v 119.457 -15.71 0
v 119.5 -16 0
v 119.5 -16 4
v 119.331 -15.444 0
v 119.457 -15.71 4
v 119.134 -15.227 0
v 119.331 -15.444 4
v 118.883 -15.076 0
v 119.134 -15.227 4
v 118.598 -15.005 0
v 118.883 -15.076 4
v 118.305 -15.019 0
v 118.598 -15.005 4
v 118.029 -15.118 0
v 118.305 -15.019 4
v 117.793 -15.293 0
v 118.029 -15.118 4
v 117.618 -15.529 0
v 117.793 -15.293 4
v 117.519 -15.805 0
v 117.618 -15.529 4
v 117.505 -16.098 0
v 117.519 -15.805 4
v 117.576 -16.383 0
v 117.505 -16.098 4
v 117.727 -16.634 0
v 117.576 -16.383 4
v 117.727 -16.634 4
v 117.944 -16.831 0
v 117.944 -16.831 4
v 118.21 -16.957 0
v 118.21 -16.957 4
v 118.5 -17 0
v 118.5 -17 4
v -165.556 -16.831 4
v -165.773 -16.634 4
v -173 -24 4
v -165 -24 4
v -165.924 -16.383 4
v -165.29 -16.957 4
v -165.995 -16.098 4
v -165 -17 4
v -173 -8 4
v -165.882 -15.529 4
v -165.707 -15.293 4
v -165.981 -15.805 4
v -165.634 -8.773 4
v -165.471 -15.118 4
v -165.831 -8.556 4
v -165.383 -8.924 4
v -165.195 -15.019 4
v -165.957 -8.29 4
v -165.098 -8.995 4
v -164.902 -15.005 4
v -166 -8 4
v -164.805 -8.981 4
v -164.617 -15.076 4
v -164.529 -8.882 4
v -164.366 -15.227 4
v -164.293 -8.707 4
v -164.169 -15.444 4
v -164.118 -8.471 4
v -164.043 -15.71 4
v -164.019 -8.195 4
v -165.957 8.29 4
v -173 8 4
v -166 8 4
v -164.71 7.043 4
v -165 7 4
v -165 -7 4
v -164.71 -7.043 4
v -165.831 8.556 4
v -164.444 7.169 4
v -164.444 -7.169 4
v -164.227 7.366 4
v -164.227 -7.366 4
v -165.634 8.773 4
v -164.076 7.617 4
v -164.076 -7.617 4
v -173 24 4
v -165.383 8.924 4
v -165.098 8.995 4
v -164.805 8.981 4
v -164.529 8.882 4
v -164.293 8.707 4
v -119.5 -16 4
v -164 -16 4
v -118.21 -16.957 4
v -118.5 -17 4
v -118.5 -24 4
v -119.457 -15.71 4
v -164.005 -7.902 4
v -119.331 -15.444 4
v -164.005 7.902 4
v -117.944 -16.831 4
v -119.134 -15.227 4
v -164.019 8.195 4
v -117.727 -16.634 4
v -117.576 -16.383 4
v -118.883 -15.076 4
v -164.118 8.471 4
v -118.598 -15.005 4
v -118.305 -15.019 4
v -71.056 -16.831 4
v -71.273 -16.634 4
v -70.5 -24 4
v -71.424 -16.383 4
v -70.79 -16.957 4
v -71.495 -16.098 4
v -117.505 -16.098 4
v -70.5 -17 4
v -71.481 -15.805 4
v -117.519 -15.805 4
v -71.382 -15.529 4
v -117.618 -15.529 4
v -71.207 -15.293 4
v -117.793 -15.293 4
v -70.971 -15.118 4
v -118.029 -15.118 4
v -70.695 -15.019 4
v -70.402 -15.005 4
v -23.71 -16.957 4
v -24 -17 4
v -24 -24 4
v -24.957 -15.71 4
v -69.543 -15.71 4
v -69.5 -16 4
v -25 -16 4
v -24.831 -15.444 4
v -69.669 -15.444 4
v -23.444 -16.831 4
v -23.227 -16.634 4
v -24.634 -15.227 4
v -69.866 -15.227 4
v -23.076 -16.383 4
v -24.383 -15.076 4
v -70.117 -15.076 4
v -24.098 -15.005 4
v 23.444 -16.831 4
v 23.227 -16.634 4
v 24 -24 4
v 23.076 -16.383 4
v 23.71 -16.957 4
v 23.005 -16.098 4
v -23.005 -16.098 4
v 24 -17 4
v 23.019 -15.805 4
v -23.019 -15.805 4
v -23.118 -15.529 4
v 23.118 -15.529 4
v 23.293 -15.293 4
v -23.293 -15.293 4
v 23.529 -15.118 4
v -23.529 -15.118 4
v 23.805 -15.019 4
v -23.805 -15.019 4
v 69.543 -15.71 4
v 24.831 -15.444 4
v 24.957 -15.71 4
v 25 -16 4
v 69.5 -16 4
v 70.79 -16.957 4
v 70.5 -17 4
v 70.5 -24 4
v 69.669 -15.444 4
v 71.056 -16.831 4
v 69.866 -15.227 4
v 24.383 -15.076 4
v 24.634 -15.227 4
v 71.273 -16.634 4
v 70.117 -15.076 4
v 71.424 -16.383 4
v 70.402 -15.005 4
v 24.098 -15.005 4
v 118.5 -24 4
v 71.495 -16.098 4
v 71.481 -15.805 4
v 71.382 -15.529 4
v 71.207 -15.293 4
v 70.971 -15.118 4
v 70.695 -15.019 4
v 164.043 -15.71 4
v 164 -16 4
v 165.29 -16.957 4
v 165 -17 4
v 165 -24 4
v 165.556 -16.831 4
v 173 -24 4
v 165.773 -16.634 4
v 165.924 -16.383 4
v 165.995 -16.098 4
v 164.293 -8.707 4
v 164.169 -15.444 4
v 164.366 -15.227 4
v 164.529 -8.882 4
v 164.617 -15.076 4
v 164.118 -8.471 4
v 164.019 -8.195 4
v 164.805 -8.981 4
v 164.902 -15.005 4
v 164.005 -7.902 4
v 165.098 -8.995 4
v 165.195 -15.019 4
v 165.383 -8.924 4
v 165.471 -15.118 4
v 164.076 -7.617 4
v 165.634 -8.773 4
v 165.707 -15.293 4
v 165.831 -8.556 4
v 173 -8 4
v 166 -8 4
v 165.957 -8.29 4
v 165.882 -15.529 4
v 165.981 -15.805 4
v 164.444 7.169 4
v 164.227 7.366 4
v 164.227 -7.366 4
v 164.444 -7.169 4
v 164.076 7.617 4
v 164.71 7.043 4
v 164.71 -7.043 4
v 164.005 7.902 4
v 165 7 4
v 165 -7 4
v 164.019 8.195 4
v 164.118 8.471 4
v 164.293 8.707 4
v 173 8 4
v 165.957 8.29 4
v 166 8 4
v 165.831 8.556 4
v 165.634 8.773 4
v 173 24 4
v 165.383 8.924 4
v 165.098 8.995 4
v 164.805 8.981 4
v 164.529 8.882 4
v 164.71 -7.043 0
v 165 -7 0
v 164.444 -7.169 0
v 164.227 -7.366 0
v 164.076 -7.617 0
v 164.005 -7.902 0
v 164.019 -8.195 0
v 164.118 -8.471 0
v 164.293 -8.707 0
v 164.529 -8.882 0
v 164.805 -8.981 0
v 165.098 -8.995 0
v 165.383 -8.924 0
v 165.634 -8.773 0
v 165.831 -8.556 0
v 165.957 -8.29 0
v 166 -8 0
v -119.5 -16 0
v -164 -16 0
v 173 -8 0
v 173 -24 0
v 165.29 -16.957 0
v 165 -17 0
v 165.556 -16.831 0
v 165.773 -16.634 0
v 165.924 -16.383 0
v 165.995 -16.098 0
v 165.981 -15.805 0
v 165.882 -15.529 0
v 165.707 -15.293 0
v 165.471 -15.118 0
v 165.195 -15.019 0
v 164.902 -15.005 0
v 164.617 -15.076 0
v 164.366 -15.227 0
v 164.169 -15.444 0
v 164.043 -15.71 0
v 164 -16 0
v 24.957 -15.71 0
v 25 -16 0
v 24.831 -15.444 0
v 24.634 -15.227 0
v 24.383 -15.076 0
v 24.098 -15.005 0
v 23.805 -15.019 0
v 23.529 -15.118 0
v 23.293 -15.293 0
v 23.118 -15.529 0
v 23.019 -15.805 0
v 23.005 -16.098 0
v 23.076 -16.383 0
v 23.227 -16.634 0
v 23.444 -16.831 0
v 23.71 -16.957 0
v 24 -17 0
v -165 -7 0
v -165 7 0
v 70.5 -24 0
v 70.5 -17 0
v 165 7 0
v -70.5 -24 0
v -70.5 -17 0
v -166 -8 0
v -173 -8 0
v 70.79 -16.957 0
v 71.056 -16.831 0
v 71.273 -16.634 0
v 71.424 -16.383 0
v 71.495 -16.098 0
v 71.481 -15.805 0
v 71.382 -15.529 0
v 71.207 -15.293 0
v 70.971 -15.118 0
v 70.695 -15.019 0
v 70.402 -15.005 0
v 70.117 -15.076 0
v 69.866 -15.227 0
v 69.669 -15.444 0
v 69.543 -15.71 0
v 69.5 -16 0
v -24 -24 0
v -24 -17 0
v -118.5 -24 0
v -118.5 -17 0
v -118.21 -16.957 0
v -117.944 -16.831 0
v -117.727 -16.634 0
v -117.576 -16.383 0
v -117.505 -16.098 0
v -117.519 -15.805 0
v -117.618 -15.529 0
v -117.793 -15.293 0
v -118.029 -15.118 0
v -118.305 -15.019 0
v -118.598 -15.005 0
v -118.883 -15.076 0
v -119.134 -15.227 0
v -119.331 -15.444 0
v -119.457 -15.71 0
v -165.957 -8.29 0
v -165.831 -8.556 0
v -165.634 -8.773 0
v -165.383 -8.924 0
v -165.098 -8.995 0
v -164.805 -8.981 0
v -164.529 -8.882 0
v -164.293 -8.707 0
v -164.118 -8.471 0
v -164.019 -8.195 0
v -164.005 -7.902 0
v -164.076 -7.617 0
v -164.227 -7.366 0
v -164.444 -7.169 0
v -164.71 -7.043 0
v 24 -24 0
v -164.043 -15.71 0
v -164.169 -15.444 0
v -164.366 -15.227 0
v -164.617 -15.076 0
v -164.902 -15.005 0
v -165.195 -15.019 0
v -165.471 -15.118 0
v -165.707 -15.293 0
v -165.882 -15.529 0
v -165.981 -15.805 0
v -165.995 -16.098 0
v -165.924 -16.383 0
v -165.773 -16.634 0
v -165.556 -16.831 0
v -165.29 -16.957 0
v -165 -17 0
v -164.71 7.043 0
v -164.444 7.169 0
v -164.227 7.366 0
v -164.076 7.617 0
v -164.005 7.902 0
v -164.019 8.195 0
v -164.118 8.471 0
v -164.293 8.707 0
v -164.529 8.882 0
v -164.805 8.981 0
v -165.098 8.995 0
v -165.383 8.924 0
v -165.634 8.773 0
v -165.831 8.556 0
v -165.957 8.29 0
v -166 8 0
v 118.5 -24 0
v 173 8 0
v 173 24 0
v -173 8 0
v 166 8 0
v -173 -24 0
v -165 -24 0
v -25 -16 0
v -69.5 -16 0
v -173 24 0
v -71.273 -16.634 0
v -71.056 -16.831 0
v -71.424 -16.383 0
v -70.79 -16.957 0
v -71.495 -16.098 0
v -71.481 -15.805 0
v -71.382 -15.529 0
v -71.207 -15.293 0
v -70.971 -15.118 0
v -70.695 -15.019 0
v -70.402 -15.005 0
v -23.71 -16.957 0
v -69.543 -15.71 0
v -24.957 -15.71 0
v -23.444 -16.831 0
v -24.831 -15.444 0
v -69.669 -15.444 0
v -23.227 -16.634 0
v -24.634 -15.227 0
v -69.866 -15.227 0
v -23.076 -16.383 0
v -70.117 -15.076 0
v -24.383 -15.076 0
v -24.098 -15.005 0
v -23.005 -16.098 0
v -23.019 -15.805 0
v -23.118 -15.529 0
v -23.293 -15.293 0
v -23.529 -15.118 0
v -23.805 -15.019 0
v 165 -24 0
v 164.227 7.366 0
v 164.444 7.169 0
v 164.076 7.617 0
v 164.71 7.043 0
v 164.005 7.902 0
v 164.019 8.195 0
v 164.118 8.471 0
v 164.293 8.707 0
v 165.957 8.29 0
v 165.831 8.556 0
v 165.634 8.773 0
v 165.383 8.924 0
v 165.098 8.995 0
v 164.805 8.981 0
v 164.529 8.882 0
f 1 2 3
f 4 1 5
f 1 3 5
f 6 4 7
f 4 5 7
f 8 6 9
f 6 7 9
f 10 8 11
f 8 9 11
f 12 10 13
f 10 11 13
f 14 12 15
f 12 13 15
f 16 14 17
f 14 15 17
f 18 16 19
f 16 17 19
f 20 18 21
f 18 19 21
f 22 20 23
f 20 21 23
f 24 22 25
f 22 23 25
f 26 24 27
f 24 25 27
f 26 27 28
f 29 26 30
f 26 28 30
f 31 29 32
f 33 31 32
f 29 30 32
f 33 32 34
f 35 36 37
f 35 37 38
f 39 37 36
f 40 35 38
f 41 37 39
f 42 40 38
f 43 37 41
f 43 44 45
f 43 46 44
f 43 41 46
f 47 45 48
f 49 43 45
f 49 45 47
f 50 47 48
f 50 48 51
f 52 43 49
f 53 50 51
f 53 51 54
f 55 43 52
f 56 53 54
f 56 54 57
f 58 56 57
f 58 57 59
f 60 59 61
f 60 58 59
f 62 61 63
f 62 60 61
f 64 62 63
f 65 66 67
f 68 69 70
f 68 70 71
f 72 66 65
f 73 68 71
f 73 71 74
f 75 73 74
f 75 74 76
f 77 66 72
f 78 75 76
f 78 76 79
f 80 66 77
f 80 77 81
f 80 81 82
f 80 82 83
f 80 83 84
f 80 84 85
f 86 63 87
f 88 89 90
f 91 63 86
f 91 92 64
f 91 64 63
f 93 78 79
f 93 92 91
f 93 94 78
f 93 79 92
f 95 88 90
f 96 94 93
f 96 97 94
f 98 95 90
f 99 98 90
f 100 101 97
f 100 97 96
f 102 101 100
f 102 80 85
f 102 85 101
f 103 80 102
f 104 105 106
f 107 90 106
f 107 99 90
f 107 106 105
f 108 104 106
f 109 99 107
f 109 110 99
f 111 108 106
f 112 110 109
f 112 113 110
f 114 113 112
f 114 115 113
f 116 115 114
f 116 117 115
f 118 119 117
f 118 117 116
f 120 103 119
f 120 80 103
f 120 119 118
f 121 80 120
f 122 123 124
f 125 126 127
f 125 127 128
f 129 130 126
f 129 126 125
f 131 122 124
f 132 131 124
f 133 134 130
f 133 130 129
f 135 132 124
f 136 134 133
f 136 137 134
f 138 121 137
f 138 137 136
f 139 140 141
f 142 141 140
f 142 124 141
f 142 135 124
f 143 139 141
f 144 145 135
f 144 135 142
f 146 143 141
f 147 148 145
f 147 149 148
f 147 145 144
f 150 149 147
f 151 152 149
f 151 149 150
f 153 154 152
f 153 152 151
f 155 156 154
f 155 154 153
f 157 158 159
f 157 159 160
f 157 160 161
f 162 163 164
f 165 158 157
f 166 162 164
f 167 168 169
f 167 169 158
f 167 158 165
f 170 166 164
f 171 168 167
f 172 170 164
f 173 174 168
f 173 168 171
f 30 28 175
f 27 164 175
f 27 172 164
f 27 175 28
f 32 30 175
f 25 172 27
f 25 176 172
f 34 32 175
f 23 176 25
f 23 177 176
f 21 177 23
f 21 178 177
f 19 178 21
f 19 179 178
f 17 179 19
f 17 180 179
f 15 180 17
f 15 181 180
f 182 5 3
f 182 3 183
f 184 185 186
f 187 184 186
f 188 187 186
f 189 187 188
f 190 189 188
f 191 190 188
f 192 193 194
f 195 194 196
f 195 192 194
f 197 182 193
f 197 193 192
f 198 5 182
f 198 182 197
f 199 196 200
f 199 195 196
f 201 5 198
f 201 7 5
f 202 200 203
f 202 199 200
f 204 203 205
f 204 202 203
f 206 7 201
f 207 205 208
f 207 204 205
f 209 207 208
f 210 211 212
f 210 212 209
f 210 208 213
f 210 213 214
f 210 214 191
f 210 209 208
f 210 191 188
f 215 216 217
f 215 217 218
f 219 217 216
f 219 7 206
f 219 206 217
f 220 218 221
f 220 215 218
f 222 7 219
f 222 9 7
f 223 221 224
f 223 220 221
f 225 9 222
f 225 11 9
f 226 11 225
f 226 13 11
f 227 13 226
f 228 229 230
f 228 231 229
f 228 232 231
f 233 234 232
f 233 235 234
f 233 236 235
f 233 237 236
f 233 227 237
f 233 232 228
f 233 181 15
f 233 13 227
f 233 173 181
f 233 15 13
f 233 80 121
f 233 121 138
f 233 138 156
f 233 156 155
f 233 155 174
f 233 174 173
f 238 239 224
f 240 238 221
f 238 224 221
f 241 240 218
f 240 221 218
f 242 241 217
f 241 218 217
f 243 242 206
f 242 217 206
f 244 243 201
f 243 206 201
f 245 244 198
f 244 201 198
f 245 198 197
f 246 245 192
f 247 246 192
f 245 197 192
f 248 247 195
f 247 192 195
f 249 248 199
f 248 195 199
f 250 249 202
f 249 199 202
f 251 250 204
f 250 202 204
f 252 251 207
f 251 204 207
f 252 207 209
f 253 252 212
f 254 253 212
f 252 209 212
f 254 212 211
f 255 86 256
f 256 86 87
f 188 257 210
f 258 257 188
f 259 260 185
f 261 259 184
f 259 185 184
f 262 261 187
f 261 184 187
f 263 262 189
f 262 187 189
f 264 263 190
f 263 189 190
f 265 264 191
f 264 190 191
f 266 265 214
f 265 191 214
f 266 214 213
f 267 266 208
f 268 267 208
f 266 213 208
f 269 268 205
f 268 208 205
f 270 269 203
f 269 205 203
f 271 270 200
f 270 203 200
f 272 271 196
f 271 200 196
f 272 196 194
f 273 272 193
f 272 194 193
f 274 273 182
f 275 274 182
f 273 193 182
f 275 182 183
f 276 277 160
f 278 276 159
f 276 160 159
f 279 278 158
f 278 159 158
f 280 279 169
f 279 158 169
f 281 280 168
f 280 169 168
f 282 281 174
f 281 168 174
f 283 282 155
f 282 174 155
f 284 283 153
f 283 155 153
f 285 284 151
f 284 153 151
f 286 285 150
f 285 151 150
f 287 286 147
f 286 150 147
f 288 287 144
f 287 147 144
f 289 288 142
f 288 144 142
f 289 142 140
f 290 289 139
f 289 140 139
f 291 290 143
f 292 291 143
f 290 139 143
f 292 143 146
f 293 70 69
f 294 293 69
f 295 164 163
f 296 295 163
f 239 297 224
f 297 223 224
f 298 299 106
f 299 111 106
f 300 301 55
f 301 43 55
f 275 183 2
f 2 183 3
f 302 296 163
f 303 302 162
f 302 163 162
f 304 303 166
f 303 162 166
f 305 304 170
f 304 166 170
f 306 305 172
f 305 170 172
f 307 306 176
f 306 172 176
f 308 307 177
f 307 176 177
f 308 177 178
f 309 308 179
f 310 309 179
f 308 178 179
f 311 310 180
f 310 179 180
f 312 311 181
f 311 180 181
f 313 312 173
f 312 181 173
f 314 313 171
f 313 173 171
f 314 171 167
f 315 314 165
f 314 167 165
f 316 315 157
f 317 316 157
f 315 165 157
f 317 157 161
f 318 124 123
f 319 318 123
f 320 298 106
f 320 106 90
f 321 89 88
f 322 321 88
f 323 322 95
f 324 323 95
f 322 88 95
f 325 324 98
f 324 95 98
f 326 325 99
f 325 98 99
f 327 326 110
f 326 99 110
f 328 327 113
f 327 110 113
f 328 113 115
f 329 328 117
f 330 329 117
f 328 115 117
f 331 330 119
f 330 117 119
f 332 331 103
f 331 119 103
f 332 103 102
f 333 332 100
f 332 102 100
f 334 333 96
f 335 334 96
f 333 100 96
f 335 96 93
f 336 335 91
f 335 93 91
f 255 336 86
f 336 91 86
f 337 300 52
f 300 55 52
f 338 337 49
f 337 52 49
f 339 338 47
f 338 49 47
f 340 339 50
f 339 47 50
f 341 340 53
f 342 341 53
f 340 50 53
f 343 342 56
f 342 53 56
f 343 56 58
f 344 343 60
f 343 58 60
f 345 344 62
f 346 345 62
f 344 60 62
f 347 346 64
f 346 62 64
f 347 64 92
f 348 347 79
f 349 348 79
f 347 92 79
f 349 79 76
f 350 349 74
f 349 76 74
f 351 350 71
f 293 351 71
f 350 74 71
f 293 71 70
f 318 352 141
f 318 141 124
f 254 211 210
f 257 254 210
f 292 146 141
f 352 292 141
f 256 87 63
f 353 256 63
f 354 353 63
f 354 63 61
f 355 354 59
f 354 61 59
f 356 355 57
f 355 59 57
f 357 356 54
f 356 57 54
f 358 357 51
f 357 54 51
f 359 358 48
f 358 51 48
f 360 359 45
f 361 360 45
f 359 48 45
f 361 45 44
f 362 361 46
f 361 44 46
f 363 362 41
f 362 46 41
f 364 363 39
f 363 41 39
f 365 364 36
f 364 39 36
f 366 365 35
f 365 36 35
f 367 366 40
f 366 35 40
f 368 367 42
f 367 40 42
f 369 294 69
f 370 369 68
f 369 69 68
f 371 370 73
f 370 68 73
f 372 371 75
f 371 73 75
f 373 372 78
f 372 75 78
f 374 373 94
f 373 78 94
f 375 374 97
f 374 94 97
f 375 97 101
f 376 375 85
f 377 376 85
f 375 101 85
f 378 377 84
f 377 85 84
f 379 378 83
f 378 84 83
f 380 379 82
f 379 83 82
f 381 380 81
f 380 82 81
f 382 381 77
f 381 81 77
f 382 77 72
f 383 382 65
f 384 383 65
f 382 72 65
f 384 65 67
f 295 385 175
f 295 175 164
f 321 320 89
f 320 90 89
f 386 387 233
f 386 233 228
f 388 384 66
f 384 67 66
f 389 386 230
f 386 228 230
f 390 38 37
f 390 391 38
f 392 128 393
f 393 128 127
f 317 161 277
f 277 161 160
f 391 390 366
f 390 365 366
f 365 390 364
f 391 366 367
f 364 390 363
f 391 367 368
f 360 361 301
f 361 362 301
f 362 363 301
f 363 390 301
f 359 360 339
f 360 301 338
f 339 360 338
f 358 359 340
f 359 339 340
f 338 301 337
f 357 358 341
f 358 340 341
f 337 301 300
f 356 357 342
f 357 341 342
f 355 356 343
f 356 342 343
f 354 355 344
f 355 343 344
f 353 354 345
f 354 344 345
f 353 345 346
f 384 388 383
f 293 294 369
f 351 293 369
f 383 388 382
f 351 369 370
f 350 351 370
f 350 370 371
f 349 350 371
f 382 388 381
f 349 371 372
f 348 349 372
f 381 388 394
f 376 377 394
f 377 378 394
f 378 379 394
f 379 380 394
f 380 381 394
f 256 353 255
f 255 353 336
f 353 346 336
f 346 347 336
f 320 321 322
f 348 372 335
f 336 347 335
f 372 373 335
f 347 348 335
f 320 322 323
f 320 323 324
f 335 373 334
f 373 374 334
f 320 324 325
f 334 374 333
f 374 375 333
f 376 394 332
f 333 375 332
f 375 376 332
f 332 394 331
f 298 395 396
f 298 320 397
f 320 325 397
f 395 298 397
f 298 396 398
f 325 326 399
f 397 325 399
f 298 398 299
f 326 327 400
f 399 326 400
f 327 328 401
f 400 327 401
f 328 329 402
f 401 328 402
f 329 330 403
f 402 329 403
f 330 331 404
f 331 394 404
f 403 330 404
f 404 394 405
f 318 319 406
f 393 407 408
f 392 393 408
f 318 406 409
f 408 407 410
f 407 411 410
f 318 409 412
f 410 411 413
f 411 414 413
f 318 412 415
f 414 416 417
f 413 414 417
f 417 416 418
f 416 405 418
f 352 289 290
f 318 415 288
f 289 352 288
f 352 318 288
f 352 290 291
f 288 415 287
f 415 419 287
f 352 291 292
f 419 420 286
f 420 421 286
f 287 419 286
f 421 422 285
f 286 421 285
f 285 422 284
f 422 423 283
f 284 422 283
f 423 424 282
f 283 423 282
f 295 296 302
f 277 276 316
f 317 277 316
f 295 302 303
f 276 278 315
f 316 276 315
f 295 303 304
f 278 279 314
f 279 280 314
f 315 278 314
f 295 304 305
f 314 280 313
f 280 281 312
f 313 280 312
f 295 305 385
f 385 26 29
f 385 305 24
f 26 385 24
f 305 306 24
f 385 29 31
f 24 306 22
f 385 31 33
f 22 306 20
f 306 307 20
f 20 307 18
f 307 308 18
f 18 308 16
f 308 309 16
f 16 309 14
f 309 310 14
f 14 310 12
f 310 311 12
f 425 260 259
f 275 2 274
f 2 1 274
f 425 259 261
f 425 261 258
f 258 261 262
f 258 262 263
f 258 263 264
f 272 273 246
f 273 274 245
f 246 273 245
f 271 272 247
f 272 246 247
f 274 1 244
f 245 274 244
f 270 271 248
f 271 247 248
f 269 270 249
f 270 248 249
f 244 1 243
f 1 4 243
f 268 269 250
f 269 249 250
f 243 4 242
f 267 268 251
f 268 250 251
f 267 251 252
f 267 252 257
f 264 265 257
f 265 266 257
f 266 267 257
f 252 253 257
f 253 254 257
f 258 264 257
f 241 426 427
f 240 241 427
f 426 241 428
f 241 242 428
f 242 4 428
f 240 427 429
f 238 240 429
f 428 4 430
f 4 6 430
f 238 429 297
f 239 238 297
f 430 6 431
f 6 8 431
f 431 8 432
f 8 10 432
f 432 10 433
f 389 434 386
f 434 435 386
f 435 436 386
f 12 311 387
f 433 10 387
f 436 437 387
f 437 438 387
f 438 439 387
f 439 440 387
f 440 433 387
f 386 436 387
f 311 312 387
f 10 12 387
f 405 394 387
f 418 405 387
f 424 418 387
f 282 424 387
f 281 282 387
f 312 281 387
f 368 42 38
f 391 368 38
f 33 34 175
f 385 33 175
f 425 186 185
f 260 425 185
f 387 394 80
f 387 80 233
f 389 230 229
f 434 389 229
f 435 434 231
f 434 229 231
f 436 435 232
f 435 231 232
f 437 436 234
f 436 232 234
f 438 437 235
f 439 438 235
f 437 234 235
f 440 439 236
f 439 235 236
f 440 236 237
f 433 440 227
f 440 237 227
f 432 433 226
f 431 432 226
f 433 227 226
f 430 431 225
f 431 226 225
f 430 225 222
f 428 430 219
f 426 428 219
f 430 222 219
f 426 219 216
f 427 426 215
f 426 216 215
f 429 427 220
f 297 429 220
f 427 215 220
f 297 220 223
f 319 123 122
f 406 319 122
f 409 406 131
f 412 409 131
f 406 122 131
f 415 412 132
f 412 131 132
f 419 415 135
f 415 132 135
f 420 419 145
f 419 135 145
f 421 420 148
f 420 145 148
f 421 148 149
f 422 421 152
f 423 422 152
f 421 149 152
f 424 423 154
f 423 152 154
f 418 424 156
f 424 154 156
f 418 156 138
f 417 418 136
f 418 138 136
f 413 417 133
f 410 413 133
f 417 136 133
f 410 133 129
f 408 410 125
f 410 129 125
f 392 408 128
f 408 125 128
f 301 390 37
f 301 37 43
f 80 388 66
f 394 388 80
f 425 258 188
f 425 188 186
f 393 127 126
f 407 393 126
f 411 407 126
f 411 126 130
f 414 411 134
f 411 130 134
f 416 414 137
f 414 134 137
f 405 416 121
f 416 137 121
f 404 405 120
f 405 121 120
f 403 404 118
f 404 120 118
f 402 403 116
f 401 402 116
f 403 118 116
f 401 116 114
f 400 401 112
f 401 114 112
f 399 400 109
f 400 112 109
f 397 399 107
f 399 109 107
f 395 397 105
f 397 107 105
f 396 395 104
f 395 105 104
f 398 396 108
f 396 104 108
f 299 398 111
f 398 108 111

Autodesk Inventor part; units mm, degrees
ref_plane "YZ Plane" through (0, 0, 0) normal (1, 0, 0) x (0, 1, 0)
ref_plane "XZ Plane" through (0, 0, 0) normal (0, 1, 0) x (-1, 0, 0)
ref_plane "XY Plane" through (0, 0, 0) normal (0, 0, 1) x (1, 0, 0)
sketch "Sketch1" plane through (0, 0, 0) normal (0, 0, 1) x (1, 0, 0)
  line L0 (-173, 24) -> (173, 24)
  line L1 (173, 24) -> (173, -24)
  line L2 (173, -24) -> (-173, -24)
  line L3 (-173, -24) -> (-173, 24)
  point P0 (0, 0)
  point P1 (173, 0)
  point P2 (0, 24)
  dimension "d0" = 48
  dimension "d1" = 346
extrude "Extrusion1" add sketch "Sketch1" along normal blind 4
sketch "Esboço2" plane through (0, 0, 4) normal (0, 0, 1) x (1, 0, 0)
  line L0 (-165, -24) -> (-118.5, -24)
  line L1 (-118.5, -24) -> (-118.5, -16)
  line L2 (-118.5, -16) -> (-165, -16)
  line L3 (-165, -16) -> (-165, -24)
  line L4 (-173, 24) -> (-173, -24) projected
  line L5 (-70.5, -24) -> (-24, -24)
  line L6 (-24, -24) -> (-24, -16)
  line L7 (-24, -16) -> (-70.5, -16)
  line L8 (-70.5, -16) -> (-70.5, -24)
  circle A0 centre (-24, -16) radius 1
  circle A1 centre (-70.5, -16) radius 1
  circle A2 centre (-118.5, -16) radius 1
  circle A3 centre (-165, -16) radius 1
  line L9 (-173, -24) -> (173, -24) projected
  point P0 (0, 0)
  dimension "d4" = 46.5
  dimension "d7" = 46.5
  dimension "d8" = 48
  dimension "d14" = 2
  dimension "d15" = 2
  dimension "d16" = 2
  dimension "d20" = 8
  dimension "d21" = 8
  dimension "d22" = 0
extrude "Extrusão2" cut sketch "Esboço2" against normal blind 10
mirror "Espelhamento1" about plane through (0, 0, 0) normal (1, 0, 0) of "Extrusão2"
sketch "Esboço3" plane through (0, 0, 4) normal (0, 0, 1) x (1, 0, 0)
  line L0 (-173, 24) -> (-173, -24) projected
  line L1 (-173, -8) -> (-165, -8)
  line L2 (-165, -8) -> (-165, 8)
  line L3 (-165, 8) -> (-173, 8)
  line L4 (-173, 8) -> (-173, -8)
  line L5 (-173, -24) -> (-165, -24) projected
  line L6 (173, 24) -> (-173, 24) projected
  circle A0 centre (-165, 8) radius 1
  circle A1 centre (-165, -8) radius 1
  point P0 (0, 0)
  dimension "d23" = 8
  dimension "d24" = 16
  dimension "d25" = 16
  dimension "d26" = 16
  dimension "d27" = 2
  dimension "d28" = 2
extrude "Extrusão3" cut sketch "Esboço3" against normal blind 10
mirror "Espelhamento2" about plane through (0, 0, 0) normal (1, 0, 0) of "Extrusão3"
properties part number "frente inferior"
